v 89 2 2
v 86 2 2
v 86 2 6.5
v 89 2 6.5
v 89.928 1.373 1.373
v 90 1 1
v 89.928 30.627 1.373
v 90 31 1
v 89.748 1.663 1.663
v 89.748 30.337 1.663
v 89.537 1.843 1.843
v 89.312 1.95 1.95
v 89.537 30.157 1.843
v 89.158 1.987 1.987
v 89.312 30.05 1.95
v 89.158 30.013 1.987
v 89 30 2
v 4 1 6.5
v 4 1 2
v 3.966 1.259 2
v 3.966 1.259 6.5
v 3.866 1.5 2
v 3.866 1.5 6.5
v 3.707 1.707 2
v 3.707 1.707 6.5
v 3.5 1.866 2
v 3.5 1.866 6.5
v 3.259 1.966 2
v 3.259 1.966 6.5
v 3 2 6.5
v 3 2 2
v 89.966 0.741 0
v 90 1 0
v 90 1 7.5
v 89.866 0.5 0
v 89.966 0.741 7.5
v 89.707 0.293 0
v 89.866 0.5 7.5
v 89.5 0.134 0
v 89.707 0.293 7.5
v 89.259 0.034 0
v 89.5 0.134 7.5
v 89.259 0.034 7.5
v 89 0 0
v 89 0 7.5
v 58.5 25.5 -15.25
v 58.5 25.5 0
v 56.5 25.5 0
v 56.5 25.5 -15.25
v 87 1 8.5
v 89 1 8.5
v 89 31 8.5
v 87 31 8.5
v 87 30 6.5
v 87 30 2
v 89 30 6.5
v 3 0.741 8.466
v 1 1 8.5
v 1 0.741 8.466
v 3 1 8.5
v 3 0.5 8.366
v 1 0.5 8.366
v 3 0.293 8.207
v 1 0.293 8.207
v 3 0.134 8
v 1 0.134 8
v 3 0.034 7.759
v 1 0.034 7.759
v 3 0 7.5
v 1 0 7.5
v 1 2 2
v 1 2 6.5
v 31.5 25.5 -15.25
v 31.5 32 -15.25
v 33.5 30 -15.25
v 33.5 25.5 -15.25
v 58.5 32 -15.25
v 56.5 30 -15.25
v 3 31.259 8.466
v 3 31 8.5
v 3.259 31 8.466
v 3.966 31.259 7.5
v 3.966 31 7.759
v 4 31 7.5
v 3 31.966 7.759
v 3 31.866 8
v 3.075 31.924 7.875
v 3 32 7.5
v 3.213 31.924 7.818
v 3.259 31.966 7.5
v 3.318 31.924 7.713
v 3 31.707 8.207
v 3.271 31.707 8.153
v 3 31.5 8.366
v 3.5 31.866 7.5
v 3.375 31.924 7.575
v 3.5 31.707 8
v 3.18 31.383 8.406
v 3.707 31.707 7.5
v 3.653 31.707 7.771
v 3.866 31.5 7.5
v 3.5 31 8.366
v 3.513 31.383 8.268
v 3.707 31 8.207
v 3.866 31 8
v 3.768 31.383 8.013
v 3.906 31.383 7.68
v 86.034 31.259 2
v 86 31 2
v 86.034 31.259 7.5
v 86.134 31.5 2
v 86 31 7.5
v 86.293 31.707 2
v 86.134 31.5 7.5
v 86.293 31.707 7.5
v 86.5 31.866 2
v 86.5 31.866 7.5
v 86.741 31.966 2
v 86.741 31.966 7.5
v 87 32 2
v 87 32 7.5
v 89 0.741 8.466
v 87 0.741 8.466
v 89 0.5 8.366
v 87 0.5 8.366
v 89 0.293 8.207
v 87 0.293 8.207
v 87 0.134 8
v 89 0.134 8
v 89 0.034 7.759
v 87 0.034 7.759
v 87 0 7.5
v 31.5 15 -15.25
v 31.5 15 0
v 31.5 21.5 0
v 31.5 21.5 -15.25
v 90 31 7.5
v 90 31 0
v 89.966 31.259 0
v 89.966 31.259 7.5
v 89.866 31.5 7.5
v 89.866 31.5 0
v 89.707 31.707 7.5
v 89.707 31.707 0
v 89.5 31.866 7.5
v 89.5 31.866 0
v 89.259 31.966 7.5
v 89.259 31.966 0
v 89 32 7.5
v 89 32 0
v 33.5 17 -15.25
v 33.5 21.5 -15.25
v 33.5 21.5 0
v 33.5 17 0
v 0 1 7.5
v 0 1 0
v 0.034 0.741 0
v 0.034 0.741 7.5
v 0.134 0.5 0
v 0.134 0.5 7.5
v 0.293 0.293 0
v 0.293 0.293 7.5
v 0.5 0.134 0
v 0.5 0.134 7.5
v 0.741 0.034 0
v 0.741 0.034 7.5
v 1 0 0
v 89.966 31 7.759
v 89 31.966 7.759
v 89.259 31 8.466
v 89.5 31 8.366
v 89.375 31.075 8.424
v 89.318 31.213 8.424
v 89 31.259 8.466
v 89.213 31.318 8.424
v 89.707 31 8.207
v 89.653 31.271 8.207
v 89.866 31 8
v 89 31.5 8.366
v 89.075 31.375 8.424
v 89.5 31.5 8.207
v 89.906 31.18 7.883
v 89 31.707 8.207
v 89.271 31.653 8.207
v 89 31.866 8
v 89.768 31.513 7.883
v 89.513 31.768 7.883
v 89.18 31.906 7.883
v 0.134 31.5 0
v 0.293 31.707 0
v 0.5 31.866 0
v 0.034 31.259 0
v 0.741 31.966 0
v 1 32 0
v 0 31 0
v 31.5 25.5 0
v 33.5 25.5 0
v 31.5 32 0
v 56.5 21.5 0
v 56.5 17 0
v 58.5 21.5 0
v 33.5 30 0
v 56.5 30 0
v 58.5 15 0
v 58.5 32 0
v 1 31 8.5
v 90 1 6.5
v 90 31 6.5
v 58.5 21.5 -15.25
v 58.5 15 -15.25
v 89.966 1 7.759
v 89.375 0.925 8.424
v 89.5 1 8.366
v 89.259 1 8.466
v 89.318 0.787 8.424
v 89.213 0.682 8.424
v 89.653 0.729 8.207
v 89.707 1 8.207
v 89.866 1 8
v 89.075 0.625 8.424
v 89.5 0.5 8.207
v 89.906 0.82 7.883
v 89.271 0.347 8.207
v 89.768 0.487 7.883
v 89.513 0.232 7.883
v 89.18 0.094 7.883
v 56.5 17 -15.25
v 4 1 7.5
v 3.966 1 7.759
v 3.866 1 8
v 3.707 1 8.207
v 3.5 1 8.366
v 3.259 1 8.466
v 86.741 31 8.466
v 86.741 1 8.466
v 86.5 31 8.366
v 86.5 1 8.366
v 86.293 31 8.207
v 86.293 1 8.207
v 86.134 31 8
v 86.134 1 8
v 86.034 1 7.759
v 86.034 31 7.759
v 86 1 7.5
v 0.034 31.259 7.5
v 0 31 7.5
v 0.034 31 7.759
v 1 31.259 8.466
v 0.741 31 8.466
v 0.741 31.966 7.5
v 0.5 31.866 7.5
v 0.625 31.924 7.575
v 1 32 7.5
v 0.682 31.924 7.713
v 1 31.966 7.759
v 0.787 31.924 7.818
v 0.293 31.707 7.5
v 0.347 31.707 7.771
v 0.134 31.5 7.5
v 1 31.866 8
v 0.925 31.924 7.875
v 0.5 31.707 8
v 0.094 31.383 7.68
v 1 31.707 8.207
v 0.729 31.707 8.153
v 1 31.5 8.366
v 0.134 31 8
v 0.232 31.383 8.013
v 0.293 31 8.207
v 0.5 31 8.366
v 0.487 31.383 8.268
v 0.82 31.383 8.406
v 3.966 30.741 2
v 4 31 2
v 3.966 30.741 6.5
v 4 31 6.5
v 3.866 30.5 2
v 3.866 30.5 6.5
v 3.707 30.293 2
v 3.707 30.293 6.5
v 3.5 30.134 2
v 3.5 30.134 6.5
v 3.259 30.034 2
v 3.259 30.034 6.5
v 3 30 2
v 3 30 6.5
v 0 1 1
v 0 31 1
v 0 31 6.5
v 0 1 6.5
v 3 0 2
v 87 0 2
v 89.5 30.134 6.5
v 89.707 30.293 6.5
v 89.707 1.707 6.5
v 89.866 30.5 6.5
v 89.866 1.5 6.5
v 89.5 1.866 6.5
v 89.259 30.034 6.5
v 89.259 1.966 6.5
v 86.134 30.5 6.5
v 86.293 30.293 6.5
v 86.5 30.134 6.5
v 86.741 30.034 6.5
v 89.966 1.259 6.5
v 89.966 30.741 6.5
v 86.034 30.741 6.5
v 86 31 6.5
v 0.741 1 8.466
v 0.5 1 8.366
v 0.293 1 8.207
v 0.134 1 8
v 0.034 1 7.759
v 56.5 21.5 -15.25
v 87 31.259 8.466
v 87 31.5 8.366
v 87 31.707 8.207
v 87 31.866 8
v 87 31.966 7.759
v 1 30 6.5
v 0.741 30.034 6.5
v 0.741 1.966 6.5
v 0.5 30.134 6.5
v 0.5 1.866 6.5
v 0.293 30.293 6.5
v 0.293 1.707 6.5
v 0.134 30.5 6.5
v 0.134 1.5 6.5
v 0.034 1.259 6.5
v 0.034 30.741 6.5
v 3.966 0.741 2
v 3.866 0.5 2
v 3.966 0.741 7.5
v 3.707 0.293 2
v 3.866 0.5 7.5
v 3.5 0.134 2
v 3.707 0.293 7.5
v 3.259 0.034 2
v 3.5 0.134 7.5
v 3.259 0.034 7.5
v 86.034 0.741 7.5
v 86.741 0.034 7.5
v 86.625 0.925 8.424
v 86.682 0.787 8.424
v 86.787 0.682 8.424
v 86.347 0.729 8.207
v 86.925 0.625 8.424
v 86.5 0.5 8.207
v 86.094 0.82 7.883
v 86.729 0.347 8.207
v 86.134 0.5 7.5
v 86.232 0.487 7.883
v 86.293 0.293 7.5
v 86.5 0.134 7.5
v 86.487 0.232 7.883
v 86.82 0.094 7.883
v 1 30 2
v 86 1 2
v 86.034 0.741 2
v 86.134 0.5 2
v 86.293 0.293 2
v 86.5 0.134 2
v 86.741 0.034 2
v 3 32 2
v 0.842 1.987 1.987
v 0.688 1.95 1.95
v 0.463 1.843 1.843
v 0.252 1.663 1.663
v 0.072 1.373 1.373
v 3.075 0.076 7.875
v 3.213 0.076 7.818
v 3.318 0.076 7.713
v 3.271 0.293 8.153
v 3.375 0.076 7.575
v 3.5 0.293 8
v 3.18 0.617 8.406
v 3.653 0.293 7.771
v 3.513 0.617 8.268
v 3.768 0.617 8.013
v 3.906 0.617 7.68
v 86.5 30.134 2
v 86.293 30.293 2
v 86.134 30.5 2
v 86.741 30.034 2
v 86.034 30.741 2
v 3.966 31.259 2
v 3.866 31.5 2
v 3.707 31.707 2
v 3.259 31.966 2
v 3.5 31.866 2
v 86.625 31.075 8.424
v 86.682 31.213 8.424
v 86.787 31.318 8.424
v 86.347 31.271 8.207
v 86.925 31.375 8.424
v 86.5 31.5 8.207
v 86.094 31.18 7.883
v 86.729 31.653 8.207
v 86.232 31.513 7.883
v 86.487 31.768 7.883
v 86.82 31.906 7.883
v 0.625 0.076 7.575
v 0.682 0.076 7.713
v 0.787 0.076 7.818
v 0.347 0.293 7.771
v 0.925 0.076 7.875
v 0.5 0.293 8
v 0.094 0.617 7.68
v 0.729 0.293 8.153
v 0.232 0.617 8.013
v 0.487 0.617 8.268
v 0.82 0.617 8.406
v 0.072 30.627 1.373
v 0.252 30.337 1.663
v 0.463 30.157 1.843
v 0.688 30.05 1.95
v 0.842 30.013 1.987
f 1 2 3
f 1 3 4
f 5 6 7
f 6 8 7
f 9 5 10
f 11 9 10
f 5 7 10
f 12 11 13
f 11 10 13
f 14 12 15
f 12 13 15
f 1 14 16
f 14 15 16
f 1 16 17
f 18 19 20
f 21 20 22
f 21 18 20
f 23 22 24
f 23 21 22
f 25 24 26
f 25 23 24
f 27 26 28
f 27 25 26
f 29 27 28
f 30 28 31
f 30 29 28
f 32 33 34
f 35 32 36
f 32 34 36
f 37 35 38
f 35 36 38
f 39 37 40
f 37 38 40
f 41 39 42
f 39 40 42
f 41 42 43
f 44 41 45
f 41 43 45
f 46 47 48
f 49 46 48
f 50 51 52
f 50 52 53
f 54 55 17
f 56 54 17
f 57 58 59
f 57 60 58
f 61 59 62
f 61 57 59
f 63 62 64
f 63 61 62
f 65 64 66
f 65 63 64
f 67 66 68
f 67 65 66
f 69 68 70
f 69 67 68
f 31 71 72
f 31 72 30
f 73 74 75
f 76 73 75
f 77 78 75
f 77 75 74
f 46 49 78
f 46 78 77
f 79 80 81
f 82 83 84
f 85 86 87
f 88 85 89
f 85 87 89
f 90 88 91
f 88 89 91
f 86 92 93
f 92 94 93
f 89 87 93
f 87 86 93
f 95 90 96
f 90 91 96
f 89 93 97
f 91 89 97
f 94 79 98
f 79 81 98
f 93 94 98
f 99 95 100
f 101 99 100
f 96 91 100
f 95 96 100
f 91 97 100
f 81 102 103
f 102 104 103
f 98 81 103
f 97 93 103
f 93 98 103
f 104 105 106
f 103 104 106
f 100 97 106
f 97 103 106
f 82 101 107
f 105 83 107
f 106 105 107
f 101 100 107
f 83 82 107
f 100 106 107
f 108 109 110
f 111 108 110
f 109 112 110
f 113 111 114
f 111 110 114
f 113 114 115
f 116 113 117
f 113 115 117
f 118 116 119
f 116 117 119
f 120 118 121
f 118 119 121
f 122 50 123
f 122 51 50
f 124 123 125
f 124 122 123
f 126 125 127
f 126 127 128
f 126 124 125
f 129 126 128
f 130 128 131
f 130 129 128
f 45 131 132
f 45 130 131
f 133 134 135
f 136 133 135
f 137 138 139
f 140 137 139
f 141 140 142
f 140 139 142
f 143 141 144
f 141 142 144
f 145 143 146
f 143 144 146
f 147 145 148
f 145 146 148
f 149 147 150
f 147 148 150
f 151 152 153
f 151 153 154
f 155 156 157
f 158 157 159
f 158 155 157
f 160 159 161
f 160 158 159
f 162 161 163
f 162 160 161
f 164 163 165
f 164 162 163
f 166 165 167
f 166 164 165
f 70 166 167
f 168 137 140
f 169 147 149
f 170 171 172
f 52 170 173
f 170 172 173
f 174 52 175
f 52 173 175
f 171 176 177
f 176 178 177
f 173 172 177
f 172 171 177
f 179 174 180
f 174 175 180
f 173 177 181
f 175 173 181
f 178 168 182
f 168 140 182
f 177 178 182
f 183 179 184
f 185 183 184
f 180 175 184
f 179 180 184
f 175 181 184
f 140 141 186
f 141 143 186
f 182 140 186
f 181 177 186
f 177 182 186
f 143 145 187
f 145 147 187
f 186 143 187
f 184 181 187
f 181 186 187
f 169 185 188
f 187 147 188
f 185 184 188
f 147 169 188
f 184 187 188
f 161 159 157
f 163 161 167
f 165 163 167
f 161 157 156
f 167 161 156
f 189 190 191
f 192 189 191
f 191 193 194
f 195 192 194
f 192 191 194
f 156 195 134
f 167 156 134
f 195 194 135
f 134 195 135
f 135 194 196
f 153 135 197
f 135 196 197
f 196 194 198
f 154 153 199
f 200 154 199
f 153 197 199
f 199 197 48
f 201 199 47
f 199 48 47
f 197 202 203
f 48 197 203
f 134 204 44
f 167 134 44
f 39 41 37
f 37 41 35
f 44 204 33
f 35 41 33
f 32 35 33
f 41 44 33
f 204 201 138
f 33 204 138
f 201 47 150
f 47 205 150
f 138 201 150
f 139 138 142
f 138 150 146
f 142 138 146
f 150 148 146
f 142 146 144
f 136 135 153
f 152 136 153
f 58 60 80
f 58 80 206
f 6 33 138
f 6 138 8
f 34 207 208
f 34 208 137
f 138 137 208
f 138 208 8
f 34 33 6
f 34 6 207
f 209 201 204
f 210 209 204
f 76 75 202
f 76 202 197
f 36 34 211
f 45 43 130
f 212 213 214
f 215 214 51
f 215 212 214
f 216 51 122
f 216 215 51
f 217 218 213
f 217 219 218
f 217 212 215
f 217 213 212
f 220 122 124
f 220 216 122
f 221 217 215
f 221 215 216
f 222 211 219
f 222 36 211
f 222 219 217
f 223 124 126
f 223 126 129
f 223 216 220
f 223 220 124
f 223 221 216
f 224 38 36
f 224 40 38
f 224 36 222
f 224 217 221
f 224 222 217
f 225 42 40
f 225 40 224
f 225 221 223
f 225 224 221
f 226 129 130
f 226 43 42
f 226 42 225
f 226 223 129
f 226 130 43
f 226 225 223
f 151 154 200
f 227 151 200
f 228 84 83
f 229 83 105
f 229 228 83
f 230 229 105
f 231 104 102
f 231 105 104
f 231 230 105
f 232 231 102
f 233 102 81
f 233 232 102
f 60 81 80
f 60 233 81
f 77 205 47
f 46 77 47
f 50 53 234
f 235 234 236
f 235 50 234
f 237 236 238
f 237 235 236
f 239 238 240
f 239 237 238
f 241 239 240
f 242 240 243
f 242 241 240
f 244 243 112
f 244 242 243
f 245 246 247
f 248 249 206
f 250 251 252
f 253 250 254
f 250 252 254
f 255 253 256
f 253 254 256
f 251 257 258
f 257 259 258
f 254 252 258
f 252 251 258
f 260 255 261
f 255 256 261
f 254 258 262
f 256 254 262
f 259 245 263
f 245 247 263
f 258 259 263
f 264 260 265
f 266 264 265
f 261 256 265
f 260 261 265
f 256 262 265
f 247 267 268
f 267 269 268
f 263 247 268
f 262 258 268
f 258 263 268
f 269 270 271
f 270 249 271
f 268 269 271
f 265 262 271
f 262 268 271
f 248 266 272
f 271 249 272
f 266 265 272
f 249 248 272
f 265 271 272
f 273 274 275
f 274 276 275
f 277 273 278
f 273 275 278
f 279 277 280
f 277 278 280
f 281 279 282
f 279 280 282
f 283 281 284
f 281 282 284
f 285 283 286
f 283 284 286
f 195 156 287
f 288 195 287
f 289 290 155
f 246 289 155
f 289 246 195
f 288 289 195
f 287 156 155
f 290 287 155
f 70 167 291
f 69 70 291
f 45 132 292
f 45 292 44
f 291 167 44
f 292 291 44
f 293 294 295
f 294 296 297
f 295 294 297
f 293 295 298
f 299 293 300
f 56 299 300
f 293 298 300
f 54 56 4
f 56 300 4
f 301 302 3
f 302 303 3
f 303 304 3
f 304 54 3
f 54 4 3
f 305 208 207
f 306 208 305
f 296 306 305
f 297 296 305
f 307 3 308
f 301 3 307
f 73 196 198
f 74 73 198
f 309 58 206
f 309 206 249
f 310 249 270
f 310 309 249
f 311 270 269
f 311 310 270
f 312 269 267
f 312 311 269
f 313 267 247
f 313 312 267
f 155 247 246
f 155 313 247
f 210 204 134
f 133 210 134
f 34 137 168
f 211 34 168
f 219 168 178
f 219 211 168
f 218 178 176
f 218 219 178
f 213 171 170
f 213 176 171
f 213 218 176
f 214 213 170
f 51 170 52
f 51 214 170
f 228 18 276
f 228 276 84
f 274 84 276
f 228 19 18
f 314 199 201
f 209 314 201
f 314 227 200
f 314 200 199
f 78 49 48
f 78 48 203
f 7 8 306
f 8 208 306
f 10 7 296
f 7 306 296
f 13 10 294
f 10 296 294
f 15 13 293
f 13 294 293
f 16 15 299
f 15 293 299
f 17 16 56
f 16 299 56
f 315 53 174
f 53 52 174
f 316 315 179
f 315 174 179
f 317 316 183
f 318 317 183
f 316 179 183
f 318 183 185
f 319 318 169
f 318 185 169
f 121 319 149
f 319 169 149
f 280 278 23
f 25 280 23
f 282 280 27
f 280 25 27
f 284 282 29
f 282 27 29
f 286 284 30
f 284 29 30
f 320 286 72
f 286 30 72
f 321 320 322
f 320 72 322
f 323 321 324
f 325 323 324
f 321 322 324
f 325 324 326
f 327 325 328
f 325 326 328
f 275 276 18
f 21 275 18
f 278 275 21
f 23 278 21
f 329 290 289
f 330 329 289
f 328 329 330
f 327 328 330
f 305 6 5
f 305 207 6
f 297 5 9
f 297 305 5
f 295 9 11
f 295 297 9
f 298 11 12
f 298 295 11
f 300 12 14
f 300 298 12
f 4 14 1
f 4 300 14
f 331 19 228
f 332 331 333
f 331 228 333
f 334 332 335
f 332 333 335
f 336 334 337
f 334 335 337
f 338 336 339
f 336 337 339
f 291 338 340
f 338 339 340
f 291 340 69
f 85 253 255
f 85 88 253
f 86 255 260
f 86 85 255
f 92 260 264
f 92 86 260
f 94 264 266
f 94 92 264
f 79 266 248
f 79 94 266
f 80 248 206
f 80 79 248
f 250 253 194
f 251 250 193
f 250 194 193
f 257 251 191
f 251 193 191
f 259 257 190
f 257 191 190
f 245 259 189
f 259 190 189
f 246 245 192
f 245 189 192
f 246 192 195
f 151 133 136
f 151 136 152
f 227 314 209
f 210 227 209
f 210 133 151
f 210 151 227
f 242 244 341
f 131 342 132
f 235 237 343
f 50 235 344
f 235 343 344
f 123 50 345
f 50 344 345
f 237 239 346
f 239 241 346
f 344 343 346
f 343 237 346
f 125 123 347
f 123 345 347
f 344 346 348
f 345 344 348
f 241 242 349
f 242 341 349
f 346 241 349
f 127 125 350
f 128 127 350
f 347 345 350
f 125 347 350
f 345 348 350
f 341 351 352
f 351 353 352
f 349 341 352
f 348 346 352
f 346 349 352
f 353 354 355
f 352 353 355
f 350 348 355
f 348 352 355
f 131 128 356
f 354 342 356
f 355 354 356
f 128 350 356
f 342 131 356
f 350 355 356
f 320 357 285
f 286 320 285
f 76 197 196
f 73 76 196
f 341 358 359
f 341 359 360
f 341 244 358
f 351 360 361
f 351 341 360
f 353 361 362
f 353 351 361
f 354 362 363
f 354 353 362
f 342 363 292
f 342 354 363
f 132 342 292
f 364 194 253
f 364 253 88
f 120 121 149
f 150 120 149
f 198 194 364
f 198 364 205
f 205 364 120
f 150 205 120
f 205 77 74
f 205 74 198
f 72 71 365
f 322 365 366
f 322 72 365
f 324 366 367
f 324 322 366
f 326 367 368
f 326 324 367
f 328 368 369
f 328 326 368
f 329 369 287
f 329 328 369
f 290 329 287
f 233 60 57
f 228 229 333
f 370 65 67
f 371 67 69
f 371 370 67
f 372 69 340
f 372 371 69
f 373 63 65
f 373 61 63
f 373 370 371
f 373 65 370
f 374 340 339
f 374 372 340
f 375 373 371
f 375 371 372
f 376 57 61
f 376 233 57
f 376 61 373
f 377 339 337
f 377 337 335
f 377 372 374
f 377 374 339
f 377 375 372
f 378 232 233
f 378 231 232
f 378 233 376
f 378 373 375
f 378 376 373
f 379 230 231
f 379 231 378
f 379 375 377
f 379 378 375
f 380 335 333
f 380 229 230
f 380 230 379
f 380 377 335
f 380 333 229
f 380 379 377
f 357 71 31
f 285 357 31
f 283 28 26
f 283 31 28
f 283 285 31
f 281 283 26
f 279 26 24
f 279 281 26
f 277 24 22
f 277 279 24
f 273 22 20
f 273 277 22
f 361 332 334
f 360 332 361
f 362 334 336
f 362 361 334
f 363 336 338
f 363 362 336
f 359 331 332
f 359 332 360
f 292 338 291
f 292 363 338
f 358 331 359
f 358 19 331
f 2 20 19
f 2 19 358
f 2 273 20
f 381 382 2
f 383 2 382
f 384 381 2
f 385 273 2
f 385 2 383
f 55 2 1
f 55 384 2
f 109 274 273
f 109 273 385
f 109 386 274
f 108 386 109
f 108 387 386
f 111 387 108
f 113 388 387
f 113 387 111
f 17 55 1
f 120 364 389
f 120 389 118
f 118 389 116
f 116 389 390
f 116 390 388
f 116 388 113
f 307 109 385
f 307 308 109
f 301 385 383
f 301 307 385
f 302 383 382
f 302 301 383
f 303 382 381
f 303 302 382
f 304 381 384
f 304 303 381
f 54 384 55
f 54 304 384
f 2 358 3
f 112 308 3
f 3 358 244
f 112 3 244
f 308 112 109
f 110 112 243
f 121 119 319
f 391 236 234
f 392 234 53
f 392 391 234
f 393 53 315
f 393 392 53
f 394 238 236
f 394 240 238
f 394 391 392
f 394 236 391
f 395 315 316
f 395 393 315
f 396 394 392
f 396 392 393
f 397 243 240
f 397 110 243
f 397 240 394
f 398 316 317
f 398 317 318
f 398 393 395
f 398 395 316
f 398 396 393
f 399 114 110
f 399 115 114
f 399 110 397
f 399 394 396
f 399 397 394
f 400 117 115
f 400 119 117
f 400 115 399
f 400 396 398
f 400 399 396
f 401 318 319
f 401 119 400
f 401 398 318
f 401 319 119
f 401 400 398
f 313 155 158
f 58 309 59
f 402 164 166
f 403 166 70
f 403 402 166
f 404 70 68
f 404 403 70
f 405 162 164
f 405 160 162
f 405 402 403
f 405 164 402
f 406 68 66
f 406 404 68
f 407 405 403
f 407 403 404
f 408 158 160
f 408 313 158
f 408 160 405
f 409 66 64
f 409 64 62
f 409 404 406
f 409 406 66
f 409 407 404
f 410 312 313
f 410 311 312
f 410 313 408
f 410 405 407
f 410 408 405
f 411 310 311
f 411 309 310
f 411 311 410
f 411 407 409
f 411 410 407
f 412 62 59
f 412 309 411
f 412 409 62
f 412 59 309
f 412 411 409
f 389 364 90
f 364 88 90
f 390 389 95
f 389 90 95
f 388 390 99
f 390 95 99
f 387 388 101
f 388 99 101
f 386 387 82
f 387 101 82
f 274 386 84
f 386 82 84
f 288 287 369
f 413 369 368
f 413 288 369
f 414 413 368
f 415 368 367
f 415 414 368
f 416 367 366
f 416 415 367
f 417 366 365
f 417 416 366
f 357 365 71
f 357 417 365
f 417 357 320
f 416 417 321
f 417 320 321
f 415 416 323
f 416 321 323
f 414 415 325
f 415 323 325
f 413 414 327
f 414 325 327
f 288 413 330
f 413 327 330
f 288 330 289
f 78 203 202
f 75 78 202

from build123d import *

# Parameters (mm, degrees)
F0_W      = 90
F0_H      = 32
F1_DEPTH  = 2
F2_W      = 4
F2_H      = 2
F3_DEPTH  = 6.5
F5_W      = 4
F5_H      = 2
F6_DEPTH  = 28
F4_W      = 4
F4_H      = 2
F7_DEPTH  = 28
F8_R      = 0.99999
F10_DEPTH = 15.25


# Not quite as in the source:
# - a fillet or chamfer is up to 0.001 mm smaller than in the source, because OpenCascade refuses the exact size


with BuildPart() as f1:
    # F0 (on Top) → F1 (new body)
    with BuildSketch(Plane.XY):
        with Locations((45, 16)):
            Rectangle(F0_W, F0_H)
    extrude(amount=F1_DEPTH)

    # F2 (on face) → F3 (join)
    with BuildSketch(Plane.XY.offset(2)):
        with Locations((2, 31)):
            Rectangle(F2_W, F2_H)
        with Locations((2, 1)):
            Rectangle(F2_W, F2_H)
        with Locations((88, 1)):
            Rectangle(F2_W, F2_H)
        with Locations((88, 31)):
            Rectangle(F2_W, F2_H)
    extrude(amount=F3_DEPTH)

    # F5 (on face) → F6 (join)
    with BuildSketch(Plane(origin=(0, 2, 0), x_dir=(-1, 0, 0), z_dir=(0, 1, 0))):
        with Locations((-2, 7.5)):
            Rectangle(F5_W, F5_H)
    extrude(amount=F6_DEPTH)

    # F4 (on face) → F7 (join)
    with BuildSketch(Plane(origin=(0, 2, 0), x_dir=(-1, 0, 0), z_dir=(0, 1, 0))):
        with Locations((-88, 7.5)):
            Rectangle(F4_W, F4_H)
    extrude(amount=F7_DEPTH)

    # F8 (radius 1 in the source; OpenCascade refuses exactly that, so slightly less here)
    f8_edges = [f1.edges().sort_by_distance(p)[0] for p in [
        (0, 16, 8.5),
        (4, 16, 8.5),
        (0, 32, 4.25),
        (0, 0, 4.25),
        (0, 16, 2),
        (2, 32, 8.5),
        (2, 0, 8.5),
        (0, 30, 4.25),
        (0, 2, 4.25),
        (4, 2, 4.25),
        (4, 30, 4.25),
        (4, 32, 5.25),
        (4, 0, 5.25),
        (86, 0, 5.25),
        (90, 0, 4.25),
        (86, 30, 4.25),
        (90, 30, 4.25),
        (86, 32, 5.25),
        (90, 32, 4.25),
        (90, 16, 8.5),
        (86, 16, 8.5),
        (88, 0, 8.5),
        (88, 32, 8.5),
        (90, 2, 4.25),
        (90, 16, 2),
    ]]
    fillet(f8_edges, radius=F8_R)

    # F9 (on face) → F10 (join)
    with BuildSketch(Plane(origin=(0, 0, 0), x_dir=(1, 0, 0), z_dir=(0, 0, -1))):
        Polygon((33.5, -30), (33.5, -25.5), (31.5, -25.5), (31.5, -32), (58.5, -32), (58.5, -25.5), (56.5, -25.5), (56.5, -30), align=None)
        Polygon((33.5, -21.5), (33.5, -17), (56.5, -17), (56.5, -21.5), (58.5, -21.5), (58.5, -15), (31.5, -15), (31.5, -21.5), align=None)
    extrude(amount=F10_DEPTH)


solid = f1.part
